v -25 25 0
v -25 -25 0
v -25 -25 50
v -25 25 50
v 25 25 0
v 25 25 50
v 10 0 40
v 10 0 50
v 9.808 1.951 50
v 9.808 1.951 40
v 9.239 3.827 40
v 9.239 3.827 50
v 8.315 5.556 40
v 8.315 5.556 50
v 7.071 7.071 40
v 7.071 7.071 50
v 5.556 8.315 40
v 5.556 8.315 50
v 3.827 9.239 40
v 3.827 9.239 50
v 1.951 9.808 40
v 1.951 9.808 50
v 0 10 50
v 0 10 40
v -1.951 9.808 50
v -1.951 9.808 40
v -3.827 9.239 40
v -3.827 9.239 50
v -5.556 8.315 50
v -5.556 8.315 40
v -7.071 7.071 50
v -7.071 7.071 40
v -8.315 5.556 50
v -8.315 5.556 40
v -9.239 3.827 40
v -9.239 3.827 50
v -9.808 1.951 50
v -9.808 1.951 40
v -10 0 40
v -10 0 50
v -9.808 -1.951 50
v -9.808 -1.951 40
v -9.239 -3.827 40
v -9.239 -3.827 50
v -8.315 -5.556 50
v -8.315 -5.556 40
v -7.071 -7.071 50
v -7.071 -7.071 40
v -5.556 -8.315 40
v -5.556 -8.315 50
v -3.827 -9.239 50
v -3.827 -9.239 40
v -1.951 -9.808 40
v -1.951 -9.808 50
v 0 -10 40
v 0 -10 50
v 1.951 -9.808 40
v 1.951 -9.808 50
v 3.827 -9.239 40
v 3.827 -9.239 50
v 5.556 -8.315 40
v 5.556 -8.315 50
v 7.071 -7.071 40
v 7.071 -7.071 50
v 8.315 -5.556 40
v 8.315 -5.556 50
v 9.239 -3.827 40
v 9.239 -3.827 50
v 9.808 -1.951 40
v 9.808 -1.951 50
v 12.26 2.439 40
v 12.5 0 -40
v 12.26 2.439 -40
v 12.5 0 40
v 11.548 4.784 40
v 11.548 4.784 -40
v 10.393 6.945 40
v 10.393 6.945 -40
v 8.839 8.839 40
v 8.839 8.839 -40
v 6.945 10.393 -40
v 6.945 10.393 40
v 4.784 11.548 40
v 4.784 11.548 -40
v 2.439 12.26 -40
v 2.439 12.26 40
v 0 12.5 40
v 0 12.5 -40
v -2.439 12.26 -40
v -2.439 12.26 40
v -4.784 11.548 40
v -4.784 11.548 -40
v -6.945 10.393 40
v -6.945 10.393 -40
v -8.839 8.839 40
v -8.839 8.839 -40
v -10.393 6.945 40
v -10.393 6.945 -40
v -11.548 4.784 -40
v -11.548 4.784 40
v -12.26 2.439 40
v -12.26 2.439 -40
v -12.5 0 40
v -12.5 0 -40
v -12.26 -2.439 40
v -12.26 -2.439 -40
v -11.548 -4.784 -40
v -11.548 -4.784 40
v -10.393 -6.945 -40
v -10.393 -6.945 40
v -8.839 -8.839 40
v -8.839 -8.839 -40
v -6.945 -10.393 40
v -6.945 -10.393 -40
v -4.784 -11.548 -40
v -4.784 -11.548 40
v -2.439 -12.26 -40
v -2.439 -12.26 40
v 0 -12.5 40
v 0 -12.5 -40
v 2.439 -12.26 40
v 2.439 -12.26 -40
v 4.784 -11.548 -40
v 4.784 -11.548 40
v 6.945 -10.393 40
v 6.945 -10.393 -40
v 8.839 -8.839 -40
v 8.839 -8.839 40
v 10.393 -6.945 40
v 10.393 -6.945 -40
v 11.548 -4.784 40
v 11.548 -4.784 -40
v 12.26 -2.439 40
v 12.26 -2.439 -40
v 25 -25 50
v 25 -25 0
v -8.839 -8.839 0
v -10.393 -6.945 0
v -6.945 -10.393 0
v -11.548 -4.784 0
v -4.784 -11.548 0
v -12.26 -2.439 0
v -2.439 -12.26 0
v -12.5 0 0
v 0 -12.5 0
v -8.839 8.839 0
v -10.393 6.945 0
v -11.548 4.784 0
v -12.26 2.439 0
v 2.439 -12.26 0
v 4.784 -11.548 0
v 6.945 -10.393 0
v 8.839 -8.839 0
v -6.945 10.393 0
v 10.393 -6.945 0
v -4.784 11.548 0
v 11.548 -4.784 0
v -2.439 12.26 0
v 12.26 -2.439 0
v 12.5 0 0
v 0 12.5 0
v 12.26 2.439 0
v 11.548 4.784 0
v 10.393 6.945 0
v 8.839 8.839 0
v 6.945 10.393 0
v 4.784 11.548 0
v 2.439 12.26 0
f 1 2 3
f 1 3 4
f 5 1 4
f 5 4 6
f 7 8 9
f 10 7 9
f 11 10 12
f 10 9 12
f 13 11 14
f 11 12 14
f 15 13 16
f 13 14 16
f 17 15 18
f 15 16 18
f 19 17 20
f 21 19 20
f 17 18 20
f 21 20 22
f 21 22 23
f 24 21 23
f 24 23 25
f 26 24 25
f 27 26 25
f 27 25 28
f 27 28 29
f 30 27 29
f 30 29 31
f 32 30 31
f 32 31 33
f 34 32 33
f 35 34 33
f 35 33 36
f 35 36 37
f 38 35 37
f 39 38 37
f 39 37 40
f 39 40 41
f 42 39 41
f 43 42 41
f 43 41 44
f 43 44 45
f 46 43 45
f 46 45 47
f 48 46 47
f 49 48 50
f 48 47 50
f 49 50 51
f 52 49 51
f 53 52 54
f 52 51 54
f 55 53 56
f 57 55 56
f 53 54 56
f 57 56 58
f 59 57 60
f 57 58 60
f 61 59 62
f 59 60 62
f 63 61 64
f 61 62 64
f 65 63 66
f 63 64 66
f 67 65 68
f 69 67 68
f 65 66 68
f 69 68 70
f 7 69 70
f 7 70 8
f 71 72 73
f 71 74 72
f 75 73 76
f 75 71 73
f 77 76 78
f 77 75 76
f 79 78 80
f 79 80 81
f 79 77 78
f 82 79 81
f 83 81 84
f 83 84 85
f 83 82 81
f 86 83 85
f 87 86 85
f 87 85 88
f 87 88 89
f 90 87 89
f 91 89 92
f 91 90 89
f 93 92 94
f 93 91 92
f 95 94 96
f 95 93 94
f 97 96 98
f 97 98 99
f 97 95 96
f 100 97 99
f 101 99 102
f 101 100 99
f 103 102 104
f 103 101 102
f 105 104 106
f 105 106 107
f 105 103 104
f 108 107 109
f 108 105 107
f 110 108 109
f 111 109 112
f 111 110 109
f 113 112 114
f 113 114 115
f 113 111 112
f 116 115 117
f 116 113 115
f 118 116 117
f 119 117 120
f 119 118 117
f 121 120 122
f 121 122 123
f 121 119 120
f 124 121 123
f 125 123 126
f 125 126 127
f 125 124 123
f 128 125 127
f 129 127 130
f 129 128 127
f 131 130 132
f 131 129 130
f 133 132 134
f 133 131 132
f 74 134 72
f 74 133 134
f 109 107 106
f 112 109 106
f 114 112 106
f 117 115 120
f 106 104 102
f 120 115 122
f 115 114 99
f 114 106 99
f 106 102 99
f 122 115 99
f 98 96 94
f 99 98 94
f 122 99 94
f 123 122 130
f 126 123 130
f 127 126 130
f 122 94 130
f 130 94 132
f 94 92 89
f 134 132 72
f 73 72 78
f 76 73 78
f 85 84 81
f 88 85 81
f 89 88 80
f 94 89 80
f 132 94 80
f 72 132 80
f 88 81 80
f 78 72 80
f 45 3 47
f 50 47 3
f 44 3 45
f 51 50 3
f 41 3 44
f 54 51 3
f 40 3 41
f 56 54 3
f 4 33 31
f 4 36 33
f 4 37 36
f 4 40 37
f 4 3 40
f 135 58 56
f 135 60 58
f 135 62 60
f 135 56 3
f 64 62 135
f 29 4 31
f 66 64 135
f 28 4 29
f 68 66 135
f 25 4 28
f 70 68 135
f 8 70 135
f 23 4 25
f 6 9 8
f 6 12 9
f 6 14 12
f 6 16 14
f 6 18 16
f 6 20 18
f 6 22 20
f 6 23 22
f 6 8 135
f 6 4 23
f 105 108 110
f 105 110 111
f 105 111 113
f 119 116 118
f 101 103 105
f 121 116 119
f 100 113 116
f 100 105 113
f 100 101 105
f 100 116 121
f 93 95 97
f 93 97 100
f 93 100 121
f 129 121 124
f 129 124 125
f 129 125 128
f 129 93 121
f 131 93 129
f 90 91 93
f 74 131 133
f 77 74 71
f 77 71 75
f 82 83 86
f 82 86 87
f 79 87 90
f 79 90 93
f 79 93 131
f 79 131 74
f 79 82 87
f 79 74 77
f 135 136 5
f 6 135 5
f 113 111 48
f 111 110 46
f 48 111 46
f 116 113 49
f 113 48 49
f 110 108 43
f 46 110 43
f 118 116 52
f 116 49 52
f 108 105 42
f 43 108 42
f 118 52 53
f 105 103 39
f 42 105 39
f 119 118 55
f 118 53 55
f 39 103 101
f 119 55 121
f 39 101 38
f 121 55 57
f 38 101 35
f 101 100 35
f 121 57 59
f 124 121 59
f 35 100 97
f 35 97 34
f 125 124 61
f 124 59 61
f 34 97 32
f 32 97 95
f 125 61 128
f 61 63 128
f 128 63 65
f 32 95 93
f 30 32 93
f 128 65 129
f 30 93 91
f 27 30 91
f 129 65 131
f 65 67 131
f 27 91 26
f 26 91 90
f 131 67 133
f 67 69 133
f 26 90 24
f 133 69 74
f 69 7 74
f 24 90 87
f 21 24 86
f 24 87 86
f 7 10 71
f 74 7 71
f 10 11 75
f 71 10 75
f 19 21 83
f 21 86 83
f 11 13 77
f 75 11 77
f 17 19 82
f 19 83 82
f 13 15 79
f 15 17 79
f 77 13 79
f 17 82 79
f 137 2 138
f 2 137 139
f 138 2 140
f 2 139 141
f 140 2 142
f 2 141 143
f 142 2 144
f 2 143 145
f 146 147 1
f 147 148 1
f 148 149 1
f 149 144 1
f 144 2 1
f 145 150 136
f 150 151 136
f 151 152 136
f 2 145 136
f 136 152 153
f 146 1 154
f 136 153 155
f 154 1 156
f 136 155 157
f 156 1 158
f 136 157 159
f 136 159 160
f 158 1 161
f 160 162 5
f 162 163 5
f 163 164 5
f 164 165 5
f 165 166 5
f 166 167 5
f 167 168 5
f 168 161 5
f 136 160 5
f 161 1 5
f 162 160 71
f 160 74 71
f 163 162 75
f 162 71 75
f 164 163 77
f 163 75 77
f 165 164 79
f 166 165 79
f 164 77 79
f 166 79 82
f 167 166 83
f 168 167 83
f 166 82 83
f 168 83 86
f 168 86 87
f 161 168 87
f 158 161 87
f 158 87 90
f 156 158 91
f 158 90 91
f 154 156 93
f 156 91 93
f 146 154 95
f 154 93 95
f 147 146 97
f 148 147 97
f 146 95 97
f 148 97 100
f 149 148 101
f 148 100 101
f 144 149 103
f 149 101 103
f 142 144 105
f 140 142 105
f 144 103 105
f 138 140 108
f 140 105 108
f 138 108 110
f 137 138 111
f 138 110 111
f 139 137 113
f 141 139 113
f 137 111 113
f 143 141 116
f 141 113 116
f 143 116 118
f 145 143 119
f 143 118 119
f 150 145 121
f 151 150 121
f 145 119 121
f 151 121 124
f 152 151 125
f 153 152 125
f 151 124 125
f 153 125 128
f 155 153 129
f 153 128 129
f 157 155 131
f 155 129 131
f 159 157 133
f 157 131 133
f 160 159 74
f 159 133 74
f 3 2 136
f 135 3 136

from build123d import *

# Parameters (mm, degrees)
F0_W     = 50
F0_H     = 50
F1_DEPTH = 50
F2_R     = 10
F3_DEPTH = 25
F4_R     = 12.5
F5_DEPTH = 40


with BuildPart() as f1:
    # F0 (on Top) → F1 (new body)
    with BuildSketch(Plane.XY):
        Rectangle(F0_W, F0_H)
    extrude(amount=F1_DEPTH)

    # F2 (on face) → F3 (cut)
    with BuildSketch(Plane.XY.offset(50)):
        Circle(F2_R)
    extrude(amount=-F3_DEPTH, mode=Mode.SUBTRACT)


with BuildPart() as f5:
    # F4 (on Top) → F5 (new body, symmetric)
    with BuildSketch(Plane.XY):
        Circle(F4_R)
    extrude(amount=F5_DEPTH, both=True)


with BuildPart() as f1_1:
    add(f1.part)

    # F6: cut F5
    add(f5.part, mode=Mode.SUBTRACT)


solid = Compound([f5.part, f1_1.part])
